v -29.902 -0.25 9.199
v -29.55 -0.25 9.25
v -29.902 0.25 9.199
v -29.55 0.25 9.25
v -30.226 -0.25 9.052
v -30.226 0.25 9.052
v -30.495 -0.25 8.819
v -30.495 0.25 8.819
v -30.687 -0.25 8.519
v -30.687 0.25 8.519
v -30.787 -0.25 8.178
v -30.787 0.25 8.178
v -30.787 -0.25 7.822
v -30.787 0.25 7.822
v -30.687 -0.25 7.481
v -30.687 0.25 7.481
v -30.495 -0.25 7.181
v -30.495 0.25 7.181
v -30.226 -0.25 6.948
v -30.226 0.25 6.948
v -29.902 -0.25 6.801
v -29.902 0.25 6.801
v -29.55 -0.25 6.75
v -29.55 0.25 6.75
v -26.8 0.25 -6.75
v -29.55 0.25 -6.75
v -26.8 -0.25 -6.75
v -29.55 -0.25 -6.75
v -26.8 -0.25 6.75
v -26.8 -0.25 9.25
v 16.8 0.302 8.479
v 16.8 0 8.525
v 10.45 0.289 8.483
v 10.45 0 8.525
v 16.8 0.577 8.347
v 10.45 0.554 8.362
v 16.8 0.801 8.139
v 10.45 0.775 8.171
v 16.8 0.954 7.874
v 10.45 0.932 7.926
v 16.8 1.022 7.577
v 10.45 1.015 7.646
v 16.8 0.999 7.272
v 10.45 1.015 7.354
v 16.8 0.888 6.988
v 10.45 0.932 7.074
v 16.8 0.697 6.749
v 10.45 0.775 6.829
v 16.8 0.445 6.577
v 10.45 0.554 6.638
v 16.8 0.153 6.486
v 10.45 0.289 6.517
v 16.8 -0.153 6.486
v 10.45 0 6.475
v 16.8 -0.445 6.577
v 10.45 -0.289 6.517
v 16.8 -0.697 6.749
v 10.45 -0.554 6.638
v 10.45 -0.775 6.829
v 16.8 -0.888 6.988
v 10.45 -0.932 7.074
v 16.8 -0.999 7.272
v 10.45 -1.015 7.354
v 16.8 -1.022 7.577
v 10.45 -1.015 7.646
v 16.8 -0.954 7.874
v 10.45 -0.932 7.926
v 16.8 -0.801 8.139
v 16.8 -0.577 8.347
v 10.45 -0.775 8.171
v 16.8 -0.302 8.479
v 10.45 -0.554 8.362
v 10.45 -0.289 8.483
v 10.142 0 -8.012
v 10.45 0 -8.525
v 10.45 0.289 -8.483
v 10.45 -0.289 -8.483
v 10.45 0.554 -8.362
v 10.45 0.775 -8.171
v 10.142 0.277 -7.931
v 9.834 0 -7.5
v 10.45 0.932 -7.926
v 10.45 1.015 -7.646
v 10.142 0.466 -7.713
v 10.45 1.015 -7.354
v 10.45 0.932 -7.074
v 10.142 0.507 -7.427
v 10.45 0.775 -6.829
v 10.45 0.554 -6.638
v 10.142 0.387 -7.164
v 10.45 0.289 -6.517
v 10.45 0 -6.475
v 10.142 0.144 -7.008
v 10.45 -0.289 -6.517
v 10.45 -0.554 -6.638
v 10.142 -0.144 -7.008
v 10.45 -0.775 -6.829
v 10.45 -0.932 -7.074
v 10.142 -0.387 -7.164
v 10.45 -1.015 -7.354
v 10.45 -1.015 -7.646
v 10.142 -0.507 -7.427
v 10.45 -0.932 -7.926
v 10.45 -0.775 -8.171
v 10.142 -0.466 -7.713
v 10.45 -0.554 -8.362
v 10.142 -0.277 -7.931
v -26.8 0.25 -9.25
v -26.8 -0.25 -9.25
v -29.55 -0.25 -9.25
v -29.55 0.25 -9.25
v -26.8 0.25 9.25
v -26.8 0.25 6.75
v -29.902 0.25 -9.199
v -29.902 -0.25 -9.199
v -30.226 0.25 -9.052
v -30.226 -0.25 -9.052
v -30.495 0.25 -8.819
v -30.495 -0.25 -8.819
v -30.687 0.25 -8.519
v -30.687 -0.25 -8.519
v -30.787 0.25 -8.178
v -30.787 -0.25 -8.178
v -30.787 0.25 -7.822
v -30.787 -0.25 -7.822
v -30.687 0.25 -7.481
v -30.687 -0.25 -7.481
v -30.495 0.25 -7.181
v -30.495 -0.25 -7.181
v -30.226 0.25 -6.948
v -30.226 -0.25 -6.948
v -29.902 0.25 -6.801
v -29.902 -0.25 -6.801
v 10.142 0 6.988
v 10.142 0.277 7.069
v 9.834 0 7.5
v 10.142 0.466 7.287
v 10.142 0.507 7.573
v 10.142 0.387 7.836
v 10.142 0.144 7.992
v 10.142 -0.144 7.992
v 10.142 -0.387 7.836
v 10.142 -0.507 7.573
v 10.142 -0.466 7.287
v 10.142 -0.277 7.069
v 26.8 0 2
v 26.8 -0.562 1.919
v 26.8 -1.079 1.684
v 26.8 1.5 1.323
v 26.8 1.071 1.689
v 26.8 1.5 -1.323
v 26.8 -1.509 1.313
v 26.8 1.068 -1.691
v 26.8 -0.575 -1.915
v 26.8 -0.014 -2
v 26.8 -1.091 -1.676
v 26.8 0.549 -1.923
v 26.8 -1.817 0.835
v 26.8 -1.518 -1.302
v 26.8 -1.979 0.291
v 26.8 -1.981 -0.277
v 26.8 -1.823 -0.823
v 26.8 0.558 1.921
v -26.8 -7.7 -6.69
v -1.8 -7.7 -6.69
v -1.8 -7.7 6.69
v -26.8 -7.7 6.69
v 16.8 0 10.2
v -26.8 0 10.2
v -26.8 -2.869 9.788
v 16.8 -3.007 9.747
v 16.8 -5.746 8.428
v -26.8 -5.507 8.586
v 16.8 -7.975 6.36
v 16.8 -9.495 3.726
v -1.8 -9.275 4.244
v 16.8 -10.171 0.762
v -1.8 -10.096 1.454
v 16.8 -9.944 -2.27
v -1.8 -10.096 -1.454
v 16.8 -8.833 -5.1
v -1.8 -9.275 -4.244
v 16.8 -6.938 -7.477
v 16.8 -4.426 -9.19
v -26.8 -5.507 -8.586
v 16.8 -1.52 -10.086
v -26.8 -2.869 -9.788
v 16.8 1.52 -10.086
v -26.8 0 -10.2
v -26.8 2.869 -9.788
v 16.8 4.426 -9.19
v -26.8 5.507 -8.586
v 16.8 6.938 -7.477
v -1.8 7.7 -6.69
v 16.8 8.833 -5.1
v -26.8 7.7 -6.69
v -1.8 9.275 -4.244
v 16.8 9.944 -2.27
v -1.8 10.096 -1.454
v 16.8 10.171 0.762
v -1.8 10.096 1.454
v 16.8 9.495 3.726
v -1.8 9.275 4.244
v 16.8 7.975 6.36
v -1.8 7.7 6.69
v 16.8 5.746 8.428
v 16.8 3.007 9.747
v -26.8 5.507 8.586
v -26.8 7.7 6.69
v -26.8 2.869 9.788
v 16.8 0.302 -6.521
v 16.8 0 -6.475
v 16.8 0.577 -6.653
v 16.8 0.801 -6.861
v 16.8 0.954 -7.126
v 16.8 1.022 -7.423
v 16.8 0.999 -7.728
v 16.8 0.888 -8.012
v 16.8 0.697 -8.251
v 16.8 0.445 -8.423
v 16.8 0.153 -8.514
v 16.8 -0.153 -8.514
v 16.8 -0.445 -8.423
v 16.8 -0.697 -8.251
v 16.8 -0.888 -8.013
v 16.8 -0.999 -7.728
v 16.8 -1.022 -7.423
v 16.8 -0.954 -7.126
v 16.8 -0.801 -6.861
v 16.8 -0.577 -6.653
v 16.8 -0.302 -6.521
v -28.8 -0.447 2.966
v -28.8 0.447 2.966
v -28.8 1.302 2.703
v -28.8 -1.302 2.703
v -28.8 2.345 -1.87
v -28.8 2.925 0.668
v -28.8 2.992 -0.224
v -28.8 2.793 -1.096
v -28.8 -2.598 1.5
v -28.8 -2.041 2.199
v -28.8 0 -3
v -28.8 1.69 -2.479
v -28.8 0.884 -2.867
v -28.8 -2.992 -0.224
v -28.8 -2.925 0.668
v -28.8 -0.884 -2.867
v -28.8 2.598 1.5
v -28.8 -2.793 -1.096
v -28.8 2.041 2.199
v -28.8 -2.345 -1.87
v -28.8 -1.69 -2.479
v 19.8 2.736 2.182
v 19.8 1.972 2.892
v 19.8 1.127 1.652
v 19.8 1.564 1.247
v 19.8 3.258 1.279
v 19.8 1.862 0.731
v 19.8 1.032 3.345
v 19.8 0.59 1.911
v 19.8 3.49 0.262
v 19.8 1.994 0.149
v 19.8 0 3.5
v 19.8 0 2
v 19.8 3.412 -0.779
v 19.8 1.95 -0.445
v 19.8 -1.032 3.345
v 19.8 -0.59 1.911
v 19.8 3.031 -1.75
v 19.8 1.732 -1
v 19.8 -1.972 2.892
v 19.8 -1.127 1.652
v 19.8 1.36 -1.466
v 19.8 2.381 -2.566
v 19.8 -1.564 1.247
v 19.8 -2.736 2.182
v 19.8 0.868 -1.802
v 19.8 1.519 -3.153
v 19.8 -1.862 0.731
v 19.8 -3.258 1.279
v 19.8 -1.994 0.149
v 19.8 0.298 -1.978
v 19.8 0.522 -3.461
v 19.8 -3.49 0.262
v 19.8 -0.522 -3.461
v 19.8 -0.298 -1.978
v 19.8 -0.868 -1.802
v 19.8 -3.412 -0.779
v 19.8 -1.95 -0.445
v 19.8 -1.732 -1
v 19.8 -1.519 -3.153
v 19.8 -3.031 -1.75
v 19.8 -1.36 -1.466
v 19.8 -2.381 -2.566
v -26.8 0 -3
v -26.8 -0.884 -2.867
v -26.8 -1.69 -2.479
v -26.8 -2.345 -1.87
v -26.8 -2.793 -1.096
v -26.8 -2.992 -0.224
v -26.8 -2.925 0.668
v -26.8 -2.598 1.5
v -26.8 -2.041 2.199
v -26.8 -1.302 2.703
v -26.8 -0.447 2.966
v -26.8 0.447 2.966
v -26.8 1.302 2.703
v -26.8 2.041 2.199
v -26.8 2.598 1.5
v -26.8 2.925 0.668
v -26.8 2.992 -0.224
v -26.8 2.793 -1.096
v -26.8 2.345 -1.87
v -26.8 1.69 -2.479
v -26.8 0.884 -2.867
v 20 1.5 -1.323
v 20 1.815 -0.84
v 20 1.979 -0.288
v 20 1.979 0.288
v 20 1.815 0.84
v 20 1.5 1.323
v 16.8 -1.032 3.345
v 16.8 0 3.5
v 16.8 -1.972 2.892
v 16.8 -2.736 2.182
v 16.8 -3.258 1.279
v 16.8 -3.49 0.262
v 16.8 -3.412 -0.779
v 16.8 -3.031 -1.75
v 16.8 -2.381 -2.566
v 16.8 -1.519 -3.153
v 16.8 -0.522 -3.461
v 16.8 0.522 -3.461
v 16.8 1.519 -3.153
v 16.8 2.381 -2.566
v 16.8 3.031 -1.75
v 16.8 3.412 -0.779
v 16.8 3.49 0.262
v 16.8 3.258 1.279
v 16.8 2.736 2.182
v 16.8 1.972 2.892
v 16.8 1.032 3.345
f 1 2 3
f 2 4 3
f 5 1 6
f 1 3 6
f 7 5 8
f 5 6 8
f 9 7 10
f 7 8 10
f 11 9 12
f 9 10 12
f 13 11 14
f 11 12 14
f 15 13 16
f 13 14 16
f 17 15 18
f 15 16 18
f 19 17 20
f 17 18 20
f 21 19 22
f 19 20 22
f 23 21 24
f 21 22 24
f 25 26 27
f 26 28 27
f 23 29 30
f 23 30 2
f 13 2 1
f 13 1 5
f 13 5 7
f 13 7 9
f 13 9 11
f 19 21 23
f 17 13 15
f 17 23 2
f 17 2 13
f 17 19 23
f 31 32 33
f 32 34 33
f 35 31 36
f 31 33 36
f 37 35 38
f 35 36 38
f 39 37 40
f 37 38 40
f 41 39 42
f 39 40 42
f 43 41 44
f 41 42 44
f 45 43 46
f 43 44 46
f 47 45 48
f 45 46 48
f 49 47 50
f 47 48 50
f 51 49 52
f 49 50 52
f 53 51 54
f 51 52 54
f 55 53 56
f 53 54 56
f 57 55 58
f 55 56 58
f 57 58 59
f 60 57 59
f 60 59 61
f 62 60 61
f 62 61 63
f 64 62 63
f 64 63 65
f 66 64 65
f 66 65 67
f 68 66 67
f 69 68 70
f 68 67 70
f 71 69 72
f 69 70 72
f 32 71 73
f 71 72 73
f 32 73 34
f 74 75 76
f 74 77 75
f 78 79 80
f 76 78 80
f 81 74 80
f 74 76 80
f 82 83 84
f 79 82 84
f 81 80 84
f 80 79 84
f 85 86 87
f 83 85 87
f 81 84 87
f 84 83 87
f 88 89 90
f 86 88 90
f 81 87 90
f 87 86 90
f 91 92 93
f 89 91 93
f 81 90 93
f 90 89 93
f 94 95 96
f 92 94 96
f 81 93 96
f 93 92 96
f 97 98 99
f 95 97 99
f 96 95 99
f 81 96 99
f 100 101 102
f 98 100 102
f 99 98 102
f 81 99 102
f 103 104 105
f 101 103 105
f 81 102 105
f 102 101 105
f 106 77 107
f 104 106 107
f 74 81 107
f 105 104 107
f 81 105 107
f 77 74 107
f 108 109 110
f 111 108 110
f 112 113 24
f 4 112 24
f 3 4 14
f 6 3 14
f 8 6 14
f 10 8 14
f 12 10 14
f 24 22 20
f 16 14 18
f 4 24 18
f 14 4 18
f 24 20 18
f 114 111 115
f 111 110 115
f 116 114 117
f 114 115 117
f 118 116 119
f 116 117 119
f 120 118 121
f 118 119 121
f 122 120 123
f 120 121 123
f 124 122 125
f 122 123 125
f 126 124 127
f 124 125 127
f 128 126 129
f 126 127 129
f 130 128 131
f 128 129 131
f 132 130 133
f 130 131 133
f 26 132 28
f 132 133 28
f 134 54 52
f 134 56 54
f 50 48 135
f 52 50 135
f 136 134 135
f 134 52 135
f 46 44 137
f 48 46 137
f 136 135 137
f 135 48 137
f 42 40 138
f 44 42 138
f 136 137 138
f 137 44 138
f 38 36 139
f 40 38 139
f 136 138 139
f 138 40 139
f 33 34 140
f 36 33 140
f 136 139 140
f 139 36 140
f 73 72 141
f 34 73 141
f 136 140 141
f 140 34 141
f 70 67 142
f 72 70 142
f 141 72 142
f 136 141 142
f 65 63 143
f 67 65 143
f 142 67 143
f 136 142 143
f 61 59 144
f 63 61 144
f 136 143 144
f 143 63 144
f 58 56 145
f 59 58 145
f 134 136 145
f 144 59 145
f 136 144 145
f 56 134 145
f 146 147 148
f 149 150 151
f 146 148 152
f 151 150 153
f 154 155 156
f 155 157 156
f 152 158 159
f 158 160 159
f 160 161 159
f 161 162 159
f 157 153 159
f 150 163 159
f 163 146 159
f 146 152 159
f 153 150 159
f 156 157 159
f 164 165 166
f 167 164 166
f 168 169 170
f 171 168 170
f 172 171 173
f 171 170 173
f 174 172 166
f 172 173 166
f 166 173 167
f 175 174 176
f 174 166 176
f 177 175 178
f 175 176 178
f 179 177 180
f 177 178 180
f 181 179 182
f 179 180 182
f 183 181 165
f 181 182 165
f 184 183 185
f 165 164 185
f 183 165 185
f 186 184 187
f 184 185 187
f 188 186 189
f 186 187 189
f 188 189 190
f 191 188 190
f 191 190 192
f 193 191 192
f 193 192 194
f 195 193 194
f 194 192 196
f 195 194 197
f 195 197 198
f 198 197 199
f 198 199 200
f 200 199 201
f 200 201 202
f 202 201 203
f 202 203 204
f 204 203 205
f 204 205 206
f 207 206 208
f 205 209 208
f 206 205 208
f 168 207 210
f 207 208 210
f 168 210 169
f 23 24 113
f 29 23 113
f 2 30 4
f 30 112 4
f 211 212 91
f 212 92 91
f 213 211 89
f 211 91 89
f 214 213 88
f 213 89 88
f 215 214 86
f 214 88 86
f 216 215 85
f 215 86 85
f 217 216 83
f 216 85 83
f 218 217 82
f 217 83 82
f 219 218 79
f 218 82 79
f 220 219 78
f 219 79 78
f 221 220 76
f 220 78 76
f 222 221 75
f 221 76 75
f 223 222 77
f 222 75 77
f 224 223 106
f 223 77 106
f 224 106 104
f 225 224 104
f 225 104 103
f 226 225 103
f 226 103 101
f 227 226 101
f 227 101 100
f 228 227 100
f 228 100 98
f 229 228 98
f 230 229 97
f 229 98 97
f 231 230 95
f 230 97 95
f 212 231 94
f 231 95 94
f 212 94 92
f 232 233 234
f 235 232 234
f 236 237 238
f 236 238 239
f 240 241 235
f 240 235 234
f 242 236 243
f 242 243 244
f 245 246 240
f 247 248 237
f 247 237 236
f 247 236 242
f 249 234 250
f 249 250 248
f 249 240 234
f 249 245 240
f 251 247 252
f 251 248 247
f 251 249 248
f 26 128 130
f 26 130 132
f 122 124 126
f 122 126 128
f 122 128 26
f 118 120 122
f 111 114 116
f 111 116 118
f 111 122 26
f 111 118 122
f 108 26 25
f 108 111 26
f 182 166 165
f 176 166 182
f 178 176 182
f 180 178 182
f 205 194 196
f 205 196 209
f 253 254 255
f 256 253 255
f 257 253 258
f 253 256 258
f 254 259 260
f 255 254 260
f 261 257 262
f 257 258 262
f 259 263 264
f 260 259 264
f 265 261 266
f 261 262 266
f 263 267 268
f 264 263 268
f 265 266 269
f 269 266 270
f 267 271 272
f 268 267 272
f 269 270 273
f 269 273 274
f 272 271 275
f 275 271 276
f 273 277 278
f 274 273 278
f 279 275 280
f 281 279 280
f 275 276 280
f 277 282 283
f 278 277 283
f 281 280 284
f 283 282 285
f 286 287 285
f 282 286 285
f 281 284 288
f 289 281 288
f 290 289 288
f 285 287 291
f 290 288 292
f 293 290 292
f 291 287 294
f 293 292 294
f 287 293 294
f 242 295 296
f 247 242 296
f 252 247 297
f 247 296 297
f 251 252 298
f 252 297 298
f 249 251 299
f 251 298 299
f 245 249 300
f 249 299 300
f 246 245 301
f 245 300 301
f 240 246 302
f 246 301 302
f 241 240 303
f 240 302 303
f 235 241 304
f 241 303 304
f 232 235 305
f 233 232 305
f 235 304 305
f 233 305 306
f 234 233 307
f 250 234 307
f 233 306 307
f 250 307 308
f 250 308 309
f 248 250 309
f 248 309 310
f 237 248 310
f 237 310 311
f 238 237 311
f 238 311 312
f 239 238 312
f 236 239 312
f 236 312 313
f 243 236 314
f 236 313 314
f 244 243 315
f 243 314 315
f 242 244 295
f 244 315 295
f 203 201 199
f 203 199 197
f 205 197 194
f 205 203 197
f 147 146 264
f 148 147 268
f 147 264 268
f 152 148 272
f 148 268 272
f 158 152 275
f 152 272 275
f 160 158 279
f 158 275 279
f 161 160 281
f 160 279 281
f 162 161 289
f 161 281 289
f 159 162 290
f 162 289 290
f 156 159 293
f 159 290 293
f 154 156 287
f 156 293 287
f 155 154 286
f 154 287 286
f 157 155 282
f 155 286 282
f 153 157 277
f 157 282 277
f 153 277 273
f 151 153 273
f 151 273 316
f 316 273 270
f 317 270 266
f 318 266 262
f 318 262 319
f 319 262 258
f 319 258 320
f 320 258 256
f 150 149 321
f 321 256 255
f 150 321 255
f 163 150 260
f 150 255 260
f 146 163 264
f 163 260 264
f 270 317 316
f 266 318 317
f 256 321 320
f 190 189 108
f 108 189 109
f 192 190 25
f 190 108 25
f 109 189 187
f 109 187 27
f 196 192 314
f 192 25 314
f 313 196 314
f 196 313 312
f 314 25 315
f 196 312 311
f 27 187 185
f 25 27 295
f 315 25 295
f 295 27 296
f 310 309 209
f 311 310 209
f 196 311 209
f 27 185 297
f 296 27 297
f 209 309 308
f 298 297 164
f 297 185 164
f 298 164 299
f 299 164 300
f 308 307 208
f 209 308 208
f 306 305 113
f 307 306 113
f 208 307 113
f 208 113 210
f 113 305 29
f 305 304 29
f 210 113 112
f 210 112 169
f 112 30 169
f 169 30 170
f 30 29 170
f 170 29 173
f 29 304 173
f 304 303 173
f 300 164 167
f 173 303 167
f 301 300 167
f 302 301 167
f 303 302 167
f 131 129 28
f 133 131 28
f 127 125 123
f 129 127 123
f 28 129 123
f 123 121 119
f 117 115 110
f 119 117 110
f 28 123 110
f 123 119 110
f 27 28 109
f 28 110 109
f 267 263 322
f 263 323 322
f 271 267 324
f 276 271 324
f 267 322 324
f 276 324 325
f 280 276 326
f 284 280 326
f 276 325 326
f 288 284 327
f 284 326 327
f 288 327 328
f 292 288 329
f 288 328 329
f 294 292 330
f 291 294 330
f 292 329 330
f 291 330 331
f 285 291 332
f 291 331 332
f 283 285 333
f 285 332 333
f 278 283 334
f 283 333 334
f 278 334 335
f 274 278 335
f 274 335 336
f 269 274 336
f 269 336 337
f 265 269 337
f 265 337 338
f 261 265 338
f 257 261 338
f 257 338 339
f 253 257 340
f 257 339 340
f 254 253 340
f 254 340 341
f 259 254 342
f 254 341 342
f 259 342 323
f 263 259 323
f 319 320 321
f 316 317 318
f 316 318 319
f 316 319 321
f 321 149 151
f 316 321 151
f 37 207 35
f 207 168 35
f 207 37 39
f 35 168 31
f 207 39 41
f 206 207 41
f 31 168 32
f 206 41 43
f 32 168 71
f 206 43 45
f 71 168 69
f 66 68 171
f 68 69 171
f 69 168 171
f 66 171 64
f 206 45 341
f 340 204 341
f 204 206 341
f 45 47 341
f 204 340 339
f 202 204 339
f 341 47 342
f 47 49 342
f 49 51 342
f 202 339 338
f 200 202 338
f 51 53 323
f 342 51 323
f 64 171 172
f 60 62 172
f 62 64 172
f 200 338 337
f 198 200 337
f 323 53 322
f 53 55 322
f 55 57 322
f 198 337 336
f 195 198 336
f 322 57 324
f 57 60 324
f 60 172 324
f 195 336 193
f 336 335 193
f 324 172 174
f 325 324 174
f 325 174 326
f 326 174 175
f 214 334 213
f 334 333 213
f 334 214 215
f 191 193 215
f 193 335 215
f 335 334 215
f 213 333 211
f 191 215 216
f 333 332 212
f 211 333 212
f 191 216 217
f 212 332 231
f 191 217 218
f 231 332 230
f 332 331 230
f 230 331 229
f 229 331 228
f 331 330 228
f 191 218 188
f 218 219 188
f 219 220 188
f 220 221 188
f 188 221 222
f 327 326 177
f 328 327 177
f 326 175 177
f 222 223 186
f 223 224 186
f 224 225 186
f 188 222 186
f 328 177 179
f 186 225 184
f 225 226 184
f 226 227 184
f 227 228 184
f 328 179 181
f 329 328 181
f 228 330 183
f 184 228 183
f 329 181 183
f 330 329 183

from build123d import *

# Parameters (mm, degrees)
CUT_EXTRUDE1_START           = -6.8
CUT_EXTRUDE1_DEPTH           = 6.8
CUT_EXTRUDE2_DEPTH           = 25
M2_5X0_45_TAPPED_HOLE1_D     = 2.05
M2_5X0_45_TAPPED_HOLE1_DEPTH = 6.35
M2_5X0_45_TAPPED_HOLE1_TIP   = 0.615882135
BOSS_EXTRUDE1_DEPTH          = 0.25
SKETCH8_R                    = 3
BOSS_EXTRUDE2_DEPTH          = 2


with BuildPart() as part:
    # Sketch1 → Revolve1 (revolve)
    with BuildSketch(Plane.XY, mode=Mode.PRIVATE) as revolve1_sk:
        Polygon((-26.8, 0), (26.8, 0), (26.8, 2), (19.8, 2), (19.8, 3.5), (16.8, 3.5), (16.8, 10.2), (-26.8, 10.2), align=None)
    revolve(revolve1_sk.sketch.rotate(Axis((-26.8, 0, 0), (1, 0, 0)), 90), axis=Axis((-26.8, 0, 0), (1, 0, 0)))

    # Sketch3 → Cut-Extrude1 (cut)
    with BuildSketch(Plane(origin=(26.8, 0, 0), x_dir=(0, 0, -1), z_dir=(1, 0, 0)).offset(CUT_EXTRUDE1_START)):
        with BuildLine():
            Line((-1.322875656, 1.5), (1.322875656, 1.5))
            ThreePointArc((1.322875656, 1.5), (0, 2), (-1.322875656, 1.5))
        make_face()
    extrude(amount=CUT_EXTRUDE1_DEPTH, mode=Mode.SUBTRACT)

    # Sketch4 → Cut-Extrude2 (cut)
    with BuildSketch(Plane.ZY.offset(26.8)):
        with BuildLine():
            Line((-6.68954408, 7.7), (6.68954408, 7.7))
            ThreePointArc((6.68954408, 7.7), (0, 10.2), (-6.68954408, 7.7))
        make_face()
        with BuildLine():
            Line((-6.68954408, -7.7), (6.68954408, -7.7))
            ThreePointArc((6.68954408, -7.7), (0, -10.2), (-6.68954408, -7.7))
        make_face()
    extrude(amount=-CUT_EXTRUDE2_DEPTH, mode=Mode.SUBTRACT)

    # M2.5x0.45 Tapped Hole1
    with Locations(Plane(origin=(16.8, 0, 0), x_dir=(0, 0, -1), z_dir=(1, 0, 0))):
        with Locations((-7.5, 0), (7.5, 0)):
            Hole(M2_5X0_45_TAPPED_HOLE1_D / 2, depth=M2_5X0_45_TAPPED_HOLE1_DEPTH)
            with Locations((0, 0, -(M2_5X0_45_TAPPED_HOLE1_DEPTH + M2_5X0_45_TAPPED_HOLE1_TIP / 2))):  # 118° drill point
                Cone(0, M2_5X0_45_TAPPED_HOLE1_D / 2, M2_5X0_45_TAPPED_HOLE1_TIP, mode=Mode.SUBTRACT)

    # Sketch7 → Boss-Extrude1 (add, symmetric)
    with BuildSketch(Plane(origin=(0, 0, 0), x_dir=(1, 0, 0), z_dir=(0, 1, 0))):
        with BuildLine():
            Line((-26.8, 9.25), (-29.55, 9.25))
            ThreePointArc((-29.55, 9.25), (-30.8, 8), (-29.55, 6.75))
            Line((-29.55, 6.75), (-26.8, 6.75))
            Line((-26.8, 6.75), (-26.8, 9.25))
        make_face()
        with BuildLine():
            Line((-26.8, -6.75), (-26.8, -9.25))
            Line((-26.8, -9.25), (-29.55, -9.25))
            ThreePointArc((-29.55, -9.25), (-30.8, -8), (-29.55, -6.75))
            Line((-29.55, -6.75), (-26.8, -6.75))
        make_face()
    extrude(amount=BOSS_EXTRUDE1_DEPTH, both=True)

    # Sketch8 → Boss-Extrude2 (add)
    with BuildSketch(Plane.ZY.offset(26.8)):
        with Locations(Location((0, 0, 0), (0, 0, 180))):
            Circle(SKETCH8_R)
    extrude(amount=BOSS_EXTRUDE2_DEPTH)


solid = part.part
